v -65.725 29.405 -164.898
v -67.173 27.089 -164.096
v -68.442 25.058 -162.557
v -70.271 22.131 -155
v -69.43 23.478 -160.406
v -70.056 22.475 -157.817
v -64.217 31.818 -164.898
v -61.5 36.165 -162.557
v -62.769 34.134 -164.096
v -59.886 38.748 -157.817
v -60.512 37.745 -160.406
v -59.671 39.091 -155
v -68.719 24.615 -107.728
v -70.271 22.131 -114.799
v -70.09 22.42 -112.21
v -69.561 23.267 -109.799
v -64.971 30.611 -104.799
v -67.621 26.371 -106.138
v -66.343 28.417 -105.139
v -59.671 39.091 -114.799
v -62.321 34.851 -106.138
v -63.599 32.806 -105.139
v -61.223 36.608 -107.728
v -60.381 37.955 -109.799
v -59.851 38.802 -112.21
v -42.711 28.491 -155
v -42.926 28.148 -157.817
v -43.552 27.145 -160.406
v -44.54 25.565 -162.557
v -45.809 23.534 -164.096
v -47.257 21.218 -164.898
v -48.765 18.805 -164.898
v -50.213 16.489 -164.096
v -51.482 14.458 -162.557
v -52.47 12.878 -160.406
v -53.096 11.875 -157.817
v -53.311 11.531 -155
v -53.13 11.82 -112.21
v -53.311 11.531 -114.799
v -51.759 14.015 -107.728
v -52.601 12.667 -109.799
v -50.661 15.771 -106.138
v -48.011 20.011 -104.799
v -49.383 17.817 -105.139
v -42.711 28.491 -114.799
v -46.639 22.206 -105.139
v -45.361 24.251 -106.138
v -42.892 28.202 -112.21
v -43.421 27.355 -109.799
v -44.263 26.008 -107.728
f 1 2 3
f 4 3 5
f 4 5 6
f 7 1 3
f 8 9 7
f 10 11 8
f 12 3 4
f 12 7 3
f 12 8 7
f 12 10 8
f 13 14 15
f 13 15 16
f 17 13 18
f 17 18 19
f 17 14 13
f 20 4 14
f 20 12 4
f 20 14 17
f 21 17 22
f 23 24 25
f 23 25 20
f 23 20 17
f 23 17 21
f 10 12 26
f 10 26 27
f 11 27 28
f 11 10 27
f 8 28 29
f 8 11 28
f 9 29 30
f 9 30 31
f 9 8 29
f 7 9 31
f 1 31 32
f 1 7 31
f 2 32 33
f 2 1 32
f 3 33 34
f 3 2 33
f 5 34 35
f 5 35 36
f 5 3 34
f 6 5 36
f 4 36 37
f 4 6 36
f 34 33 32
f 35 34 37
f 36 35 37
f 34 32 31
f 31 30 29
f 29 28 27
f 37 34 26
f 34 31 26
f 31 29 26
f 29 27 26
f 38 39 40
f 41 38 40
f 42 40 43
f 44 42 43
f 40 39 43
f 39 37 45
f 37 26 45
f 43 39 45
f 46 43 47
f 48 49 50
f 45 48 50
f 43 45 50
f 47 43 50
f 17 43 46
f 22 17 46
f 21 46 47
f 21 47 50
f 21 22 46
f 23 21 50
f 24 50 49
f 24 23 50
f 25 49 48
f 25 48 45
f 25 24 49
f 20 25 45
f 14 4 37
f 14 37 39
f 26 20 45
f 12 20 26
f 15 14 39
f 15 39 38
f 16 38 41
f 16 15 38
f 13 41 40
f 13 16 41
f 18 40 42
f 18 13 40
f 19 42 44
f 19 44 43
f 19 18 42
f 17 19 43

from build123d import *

# Parameters (mm, degrees)
BOSS_EXTRU_1_START = 35
BOSS_EXTRU_1_DEPTH = 20


with BuildPart() as part:
    # Esquisse1 → Boss.-Extru.1 (new body)
    with BuildSketch(Plane(origin=(-30.798605227, 19.249128267, 0), x_dir=(0, 0, 1), z_dir=(-0.8479983040028684, 0.5299989400067315, 0)).offset(BOSS_EXTRU_1_START)):
        with BuildLine():
            ThreePointArc((-145, -8.476131376), (-147.928932188, -1.405063564), (-155, 1.523868624))
            Line((-155, 1.523868624), (-155, -18.476131376))
            ThreePointArc((-155, -18.476131376), (-147.928932188, -15.547199188), (-145, -8.476131376))
        make_face()
        with BuildLine():
            Line((-155, -18.476131376), (-155, 1.523868624))
            ThreePointArc((-155, 1.523868624), (-165, -8.476131376), (-155, -18.476131376))
        make_face()
        with BuildLine():
            Line((-114.7986167, 1.523868624), (-155, 1.523868624))
            ThreePointArc((-155, 1.523868624), (-147.928932188, -1.405063564), (-145, -8.476131376))
            ThreePointArc((-145, -8.476131376), (-147.928932188, -15.547199188), (-155, -18.476131376))
            Line((-155, -18.476131376), (-114.7986167, -18.476131376))
            ThreePointArc((-114.7986167, -18.476131376), (-124.7986167, -8.476131376), (-114.7986167, 1.523868624))
        make_face()
        with BuildLine():
            ThreePointArc((-104.7986167, -8.476131376), (-107.727548888, -1.405063564), (-114.7986167, 1.523868624))
            Line((-114.7986167, 1.523868624), (-114.7986167, -18.476131376))
            ThreePointArc((-114.7986167, -18.476131376), (-107.727548888, -15.547199188), (-104.7986167, -8.476131376))
        make_face()
        with BuildLine():
            Line((-114.7986167, -18.476131376), (-114.7986167, 1.523868624))
            ThreePointArc((-114.7986167, 1.523868624), (-124.7986167, -8.476131376), (-114.7986167, -18.476131376))
        make_face()
    extrude(amount=-BOSS_EXTRU_1_DEPTH)


solid = part.part
